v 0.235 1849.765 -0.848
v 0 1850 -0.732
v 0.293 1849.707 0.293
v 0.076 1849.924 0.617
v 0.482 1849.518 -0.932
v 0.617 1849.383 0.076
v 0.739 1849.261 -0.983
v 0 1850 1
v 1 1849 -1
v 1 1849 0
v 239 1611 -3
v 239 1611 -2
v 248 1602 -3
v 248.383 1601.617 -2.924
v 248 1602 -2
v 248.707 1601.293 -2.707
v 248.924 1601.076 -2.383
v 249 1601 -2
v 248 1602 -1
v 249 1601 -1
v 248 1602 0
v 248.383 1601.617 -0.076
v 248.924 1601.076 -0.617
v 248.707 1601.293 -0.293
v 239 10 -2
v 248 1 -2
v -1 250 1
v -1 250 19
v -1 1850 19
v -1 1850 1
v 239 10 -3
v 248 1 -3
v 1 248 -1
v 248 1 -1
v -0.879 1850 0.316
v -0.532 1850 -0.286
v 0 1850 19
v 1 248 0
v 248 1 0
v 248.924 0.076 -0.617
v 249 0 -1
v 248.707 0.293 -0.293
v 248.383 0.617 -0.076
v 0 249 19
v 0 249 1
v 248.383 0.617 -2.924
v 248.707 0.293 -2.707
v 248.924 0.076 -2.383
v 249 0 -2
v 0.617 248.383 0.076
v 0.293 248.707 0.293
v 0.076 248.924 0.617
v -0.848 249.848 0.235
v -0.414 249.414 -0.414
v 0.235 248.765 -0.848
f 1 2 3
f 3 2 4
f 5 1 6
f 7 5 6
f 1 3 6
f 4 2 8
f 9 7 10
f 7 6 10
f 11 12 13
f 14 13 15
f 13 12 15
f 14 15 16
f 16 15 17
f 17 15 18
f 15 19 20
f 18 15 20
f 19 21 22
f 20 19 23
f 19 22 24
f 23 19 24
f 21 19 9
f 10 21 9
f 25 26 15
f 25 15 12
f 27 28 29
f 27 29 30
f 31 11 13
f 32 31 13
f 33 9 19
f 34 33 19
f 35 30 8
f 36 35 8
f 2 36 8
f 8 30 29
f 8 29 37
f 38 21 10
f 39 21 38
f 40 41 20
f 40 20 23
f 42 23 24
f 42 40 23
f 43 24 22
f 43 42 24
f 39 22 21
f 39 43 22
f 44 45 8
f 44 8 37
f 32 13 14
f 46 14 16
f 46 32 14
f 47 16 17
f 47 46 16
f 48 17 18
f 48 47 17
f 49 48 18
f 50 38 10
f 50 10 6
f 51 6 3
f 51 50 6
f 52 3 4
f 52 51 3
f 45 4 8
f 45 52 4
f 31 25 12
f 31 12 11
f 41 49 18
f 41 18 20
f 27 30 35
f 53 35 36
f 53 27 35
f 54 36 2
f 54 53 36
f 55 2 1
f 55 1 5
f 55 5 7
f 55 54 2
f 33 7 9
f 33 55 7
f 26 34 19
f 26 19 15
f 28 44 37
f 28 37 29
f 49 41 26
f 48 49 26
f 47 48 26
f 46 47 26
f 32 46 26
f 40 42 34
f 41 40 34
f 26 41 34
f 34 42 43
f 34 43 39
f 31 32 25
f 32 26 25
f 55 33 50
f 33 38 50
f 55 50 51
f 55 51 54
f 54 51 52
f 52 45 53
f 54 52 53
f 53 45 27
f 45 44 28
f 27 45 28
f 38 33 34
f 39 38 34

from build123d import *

# Parameters (mm, degrees)
F1_DEPTH = 1850
F3_DEPTH = 25
F5_DEPTH = 25


with BuildPart() as f1:
    # F0 (on Front) → F1 (new body)
    with BuildSketch(Plane.XZ):
        with BuildLine():
            Line((0, 1), (0, 19))
            Line((0, 19), (-1, 19))
            Line((-1, 19), (-1, 1))
            ThreePointArc((-1, 1), (-0.4142135624, -0.4142135624), (1, -1))
            Line((1, -1), (248, -1))
            Line((248, -1), (248, -2))
            Line((248, -2), (239, -2))
            Line((239, -2), (239, -3))
            Line((239, -3), (248, -3))
            ThreePointArc((248, -3), (248.7071067812, -2.7071067812), (249, -2))
            Line((249, -2), (249, -1))
            ThreePointArc((249, -1), (248.7071067812, -0.2928932188), (248, 0))
            Line((248, 0), (1, 0))
            ThreePointArc((1, 0), (0.2928932188, 0.2928932188), (0, 1))
        make_face()
    extrude(amount=-F1_DEPTH)

    # F2 (on face) → F3 (cut, symmetric)
    with BuildSketch(Plane.XY):
        Polygon((249, -77.7916684747), (249, 0), (-151, 400), (-151, 0), (-141.1382748954, -77.7916684747), align=None)
    extrude(amount=F3_DEPTH, both=True, mode=Mode.SUBTRACT)

    # F4 (on face) → F5 (cut, symmetric)
    with BuildSketch(Plane.XY):
        Polygon((0, 1893.902085615), (0, 1850), (456.097914385, 1393.902085615), (456.097914385, 1893.902085615), align=None)
    extrude(amount=F5_DEPTH, both=True, mode=Mode.SUBTRACT)


solid = f1.part
